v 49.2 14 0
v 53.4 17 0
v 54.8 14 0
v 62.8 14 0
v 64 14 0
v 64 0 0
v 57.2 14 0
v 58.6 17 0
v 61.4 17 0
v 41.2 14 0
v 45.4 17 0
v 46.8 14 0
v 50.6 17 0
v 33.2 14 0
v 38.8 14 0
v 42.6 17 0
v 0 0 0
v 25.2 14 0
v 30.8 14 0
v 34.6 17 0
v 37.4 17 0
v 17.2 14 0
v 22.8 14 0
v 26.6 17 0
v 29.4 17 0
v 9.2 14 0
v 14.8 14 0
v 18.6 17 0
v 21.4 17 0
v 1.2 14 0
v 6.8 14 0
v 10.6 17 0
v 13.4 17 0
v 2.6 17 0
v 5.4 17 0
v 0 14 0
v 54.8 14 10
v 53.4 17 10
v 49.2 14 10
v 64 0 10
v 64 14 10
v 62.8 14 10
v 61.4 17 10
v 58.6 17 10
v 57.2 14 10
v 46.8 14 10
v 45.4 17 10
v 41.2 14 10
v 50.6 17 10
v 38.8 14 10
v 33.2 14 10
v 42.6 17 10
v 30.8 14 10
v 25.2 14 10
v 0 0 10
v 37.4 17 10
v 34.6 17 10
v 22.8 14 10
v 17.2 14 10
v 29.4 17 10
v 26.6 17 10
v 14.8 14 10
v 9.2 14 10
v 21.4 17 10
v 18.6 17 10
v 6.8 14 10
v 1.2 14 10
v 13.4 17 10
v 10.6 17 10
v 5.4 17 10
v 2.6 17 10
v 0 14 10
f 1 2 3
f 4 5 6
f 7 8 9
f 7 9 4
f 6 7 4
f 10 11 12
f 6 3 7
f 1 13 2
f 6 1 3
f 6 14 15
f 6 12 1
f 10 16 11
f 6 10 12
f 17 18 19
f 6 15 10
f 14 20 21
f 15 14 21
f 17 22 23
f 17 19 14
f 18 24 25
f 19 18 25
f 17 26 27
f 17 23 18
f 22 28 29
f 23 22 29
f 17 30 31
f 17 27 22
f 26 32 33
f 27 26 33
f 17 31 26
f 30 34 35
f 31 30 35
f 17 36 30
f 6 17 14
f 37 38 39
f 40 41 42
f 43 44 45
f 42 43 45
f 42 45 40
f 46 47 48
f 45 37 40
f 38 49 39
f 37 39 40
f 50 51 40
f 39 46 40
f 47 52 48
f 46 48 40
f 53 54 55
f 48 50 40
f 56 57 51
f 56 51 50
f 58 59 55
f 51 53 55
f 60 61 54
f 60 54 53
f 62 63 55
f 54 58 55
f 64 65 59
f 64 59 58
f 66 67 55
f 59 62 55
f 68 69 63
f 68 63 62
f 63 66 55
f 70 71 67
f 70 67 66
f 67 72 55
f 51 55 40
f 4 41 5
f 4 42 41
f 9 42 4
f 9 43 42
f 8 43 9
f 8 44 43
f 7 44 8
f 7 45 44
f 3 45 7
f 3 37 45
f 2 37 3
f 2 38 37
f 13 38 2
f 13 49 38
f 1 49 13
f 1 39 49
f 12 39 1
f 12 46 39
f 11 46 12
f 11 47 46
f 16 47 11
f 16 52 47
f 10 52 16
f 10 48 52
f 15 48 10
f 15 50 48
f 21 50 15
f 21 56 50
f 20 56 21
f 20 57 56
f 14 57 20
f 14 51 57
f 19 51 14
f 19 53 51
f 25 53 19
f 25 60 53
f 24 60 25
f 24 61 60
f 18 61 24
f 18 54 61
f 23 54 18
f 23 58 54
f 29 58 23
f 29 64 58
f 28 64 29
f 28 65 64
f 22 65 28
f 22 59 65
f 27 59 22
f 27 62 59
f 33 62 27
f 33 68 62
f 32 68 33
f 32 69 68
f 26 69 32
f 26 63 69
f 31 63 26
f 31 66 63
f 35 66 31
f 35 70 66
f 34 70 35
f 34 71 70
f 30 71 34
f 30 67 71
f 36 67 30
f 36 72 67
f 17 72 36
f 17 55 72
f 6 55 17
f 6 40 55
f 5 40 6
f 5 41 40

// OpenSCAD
$fn = 32;

// ----------------------------------------------------------------------
// Gear rack: 8 teeth, pitch 8 mm
// ----------------------------------------------------------------------

// --- parameters (mm) ---
teeth = 8;                // number of teeth
pitch = 8;                // tooth pitch, X
root_w = 5.6;             // tooth width at the root
tip_w = 2.8;              // tooth width at the tip
base_h = 14;              // rack body height, Y
tooth_h = 3;              // tooth height above the body
plate_t = 10;             // rack width, Z (extrusion height)

rack_l = teeth * pitch;  // overall length
total_h = base_h + tooth_h;  // overall height

profile = [[0, 0], [64, 0], [64, 14], [62.8, 14], [61.4, 17], [58.6, 17], [57.2, 14], [54.8, 14], [53.4, 17], [50.6, 17], [49.2, 14], [46.8, 14], [45.4, 17], [42.6, 17], [41.2, 14], [38.8, 14], [37.4, 17], [34.6, 17], [33.2, 14], [30.8, 14], [29.4, 17], [26.6, 17], [25.2, 14], [22.8, 14], [21.4, 17], [18.6, 17], [17.2, 14], [14.8, 14], [13.4, 17], [10.6, 17], [9.2, 14], [6.8, 14], [5.4, 17], [2.6, 17], [1.2, 14], [0, 14]];  // primary outline, 36 points, counter clockwise

// --- the one profile operation ---
linear_extrude(height = plate_t) polygon(points = profile);
